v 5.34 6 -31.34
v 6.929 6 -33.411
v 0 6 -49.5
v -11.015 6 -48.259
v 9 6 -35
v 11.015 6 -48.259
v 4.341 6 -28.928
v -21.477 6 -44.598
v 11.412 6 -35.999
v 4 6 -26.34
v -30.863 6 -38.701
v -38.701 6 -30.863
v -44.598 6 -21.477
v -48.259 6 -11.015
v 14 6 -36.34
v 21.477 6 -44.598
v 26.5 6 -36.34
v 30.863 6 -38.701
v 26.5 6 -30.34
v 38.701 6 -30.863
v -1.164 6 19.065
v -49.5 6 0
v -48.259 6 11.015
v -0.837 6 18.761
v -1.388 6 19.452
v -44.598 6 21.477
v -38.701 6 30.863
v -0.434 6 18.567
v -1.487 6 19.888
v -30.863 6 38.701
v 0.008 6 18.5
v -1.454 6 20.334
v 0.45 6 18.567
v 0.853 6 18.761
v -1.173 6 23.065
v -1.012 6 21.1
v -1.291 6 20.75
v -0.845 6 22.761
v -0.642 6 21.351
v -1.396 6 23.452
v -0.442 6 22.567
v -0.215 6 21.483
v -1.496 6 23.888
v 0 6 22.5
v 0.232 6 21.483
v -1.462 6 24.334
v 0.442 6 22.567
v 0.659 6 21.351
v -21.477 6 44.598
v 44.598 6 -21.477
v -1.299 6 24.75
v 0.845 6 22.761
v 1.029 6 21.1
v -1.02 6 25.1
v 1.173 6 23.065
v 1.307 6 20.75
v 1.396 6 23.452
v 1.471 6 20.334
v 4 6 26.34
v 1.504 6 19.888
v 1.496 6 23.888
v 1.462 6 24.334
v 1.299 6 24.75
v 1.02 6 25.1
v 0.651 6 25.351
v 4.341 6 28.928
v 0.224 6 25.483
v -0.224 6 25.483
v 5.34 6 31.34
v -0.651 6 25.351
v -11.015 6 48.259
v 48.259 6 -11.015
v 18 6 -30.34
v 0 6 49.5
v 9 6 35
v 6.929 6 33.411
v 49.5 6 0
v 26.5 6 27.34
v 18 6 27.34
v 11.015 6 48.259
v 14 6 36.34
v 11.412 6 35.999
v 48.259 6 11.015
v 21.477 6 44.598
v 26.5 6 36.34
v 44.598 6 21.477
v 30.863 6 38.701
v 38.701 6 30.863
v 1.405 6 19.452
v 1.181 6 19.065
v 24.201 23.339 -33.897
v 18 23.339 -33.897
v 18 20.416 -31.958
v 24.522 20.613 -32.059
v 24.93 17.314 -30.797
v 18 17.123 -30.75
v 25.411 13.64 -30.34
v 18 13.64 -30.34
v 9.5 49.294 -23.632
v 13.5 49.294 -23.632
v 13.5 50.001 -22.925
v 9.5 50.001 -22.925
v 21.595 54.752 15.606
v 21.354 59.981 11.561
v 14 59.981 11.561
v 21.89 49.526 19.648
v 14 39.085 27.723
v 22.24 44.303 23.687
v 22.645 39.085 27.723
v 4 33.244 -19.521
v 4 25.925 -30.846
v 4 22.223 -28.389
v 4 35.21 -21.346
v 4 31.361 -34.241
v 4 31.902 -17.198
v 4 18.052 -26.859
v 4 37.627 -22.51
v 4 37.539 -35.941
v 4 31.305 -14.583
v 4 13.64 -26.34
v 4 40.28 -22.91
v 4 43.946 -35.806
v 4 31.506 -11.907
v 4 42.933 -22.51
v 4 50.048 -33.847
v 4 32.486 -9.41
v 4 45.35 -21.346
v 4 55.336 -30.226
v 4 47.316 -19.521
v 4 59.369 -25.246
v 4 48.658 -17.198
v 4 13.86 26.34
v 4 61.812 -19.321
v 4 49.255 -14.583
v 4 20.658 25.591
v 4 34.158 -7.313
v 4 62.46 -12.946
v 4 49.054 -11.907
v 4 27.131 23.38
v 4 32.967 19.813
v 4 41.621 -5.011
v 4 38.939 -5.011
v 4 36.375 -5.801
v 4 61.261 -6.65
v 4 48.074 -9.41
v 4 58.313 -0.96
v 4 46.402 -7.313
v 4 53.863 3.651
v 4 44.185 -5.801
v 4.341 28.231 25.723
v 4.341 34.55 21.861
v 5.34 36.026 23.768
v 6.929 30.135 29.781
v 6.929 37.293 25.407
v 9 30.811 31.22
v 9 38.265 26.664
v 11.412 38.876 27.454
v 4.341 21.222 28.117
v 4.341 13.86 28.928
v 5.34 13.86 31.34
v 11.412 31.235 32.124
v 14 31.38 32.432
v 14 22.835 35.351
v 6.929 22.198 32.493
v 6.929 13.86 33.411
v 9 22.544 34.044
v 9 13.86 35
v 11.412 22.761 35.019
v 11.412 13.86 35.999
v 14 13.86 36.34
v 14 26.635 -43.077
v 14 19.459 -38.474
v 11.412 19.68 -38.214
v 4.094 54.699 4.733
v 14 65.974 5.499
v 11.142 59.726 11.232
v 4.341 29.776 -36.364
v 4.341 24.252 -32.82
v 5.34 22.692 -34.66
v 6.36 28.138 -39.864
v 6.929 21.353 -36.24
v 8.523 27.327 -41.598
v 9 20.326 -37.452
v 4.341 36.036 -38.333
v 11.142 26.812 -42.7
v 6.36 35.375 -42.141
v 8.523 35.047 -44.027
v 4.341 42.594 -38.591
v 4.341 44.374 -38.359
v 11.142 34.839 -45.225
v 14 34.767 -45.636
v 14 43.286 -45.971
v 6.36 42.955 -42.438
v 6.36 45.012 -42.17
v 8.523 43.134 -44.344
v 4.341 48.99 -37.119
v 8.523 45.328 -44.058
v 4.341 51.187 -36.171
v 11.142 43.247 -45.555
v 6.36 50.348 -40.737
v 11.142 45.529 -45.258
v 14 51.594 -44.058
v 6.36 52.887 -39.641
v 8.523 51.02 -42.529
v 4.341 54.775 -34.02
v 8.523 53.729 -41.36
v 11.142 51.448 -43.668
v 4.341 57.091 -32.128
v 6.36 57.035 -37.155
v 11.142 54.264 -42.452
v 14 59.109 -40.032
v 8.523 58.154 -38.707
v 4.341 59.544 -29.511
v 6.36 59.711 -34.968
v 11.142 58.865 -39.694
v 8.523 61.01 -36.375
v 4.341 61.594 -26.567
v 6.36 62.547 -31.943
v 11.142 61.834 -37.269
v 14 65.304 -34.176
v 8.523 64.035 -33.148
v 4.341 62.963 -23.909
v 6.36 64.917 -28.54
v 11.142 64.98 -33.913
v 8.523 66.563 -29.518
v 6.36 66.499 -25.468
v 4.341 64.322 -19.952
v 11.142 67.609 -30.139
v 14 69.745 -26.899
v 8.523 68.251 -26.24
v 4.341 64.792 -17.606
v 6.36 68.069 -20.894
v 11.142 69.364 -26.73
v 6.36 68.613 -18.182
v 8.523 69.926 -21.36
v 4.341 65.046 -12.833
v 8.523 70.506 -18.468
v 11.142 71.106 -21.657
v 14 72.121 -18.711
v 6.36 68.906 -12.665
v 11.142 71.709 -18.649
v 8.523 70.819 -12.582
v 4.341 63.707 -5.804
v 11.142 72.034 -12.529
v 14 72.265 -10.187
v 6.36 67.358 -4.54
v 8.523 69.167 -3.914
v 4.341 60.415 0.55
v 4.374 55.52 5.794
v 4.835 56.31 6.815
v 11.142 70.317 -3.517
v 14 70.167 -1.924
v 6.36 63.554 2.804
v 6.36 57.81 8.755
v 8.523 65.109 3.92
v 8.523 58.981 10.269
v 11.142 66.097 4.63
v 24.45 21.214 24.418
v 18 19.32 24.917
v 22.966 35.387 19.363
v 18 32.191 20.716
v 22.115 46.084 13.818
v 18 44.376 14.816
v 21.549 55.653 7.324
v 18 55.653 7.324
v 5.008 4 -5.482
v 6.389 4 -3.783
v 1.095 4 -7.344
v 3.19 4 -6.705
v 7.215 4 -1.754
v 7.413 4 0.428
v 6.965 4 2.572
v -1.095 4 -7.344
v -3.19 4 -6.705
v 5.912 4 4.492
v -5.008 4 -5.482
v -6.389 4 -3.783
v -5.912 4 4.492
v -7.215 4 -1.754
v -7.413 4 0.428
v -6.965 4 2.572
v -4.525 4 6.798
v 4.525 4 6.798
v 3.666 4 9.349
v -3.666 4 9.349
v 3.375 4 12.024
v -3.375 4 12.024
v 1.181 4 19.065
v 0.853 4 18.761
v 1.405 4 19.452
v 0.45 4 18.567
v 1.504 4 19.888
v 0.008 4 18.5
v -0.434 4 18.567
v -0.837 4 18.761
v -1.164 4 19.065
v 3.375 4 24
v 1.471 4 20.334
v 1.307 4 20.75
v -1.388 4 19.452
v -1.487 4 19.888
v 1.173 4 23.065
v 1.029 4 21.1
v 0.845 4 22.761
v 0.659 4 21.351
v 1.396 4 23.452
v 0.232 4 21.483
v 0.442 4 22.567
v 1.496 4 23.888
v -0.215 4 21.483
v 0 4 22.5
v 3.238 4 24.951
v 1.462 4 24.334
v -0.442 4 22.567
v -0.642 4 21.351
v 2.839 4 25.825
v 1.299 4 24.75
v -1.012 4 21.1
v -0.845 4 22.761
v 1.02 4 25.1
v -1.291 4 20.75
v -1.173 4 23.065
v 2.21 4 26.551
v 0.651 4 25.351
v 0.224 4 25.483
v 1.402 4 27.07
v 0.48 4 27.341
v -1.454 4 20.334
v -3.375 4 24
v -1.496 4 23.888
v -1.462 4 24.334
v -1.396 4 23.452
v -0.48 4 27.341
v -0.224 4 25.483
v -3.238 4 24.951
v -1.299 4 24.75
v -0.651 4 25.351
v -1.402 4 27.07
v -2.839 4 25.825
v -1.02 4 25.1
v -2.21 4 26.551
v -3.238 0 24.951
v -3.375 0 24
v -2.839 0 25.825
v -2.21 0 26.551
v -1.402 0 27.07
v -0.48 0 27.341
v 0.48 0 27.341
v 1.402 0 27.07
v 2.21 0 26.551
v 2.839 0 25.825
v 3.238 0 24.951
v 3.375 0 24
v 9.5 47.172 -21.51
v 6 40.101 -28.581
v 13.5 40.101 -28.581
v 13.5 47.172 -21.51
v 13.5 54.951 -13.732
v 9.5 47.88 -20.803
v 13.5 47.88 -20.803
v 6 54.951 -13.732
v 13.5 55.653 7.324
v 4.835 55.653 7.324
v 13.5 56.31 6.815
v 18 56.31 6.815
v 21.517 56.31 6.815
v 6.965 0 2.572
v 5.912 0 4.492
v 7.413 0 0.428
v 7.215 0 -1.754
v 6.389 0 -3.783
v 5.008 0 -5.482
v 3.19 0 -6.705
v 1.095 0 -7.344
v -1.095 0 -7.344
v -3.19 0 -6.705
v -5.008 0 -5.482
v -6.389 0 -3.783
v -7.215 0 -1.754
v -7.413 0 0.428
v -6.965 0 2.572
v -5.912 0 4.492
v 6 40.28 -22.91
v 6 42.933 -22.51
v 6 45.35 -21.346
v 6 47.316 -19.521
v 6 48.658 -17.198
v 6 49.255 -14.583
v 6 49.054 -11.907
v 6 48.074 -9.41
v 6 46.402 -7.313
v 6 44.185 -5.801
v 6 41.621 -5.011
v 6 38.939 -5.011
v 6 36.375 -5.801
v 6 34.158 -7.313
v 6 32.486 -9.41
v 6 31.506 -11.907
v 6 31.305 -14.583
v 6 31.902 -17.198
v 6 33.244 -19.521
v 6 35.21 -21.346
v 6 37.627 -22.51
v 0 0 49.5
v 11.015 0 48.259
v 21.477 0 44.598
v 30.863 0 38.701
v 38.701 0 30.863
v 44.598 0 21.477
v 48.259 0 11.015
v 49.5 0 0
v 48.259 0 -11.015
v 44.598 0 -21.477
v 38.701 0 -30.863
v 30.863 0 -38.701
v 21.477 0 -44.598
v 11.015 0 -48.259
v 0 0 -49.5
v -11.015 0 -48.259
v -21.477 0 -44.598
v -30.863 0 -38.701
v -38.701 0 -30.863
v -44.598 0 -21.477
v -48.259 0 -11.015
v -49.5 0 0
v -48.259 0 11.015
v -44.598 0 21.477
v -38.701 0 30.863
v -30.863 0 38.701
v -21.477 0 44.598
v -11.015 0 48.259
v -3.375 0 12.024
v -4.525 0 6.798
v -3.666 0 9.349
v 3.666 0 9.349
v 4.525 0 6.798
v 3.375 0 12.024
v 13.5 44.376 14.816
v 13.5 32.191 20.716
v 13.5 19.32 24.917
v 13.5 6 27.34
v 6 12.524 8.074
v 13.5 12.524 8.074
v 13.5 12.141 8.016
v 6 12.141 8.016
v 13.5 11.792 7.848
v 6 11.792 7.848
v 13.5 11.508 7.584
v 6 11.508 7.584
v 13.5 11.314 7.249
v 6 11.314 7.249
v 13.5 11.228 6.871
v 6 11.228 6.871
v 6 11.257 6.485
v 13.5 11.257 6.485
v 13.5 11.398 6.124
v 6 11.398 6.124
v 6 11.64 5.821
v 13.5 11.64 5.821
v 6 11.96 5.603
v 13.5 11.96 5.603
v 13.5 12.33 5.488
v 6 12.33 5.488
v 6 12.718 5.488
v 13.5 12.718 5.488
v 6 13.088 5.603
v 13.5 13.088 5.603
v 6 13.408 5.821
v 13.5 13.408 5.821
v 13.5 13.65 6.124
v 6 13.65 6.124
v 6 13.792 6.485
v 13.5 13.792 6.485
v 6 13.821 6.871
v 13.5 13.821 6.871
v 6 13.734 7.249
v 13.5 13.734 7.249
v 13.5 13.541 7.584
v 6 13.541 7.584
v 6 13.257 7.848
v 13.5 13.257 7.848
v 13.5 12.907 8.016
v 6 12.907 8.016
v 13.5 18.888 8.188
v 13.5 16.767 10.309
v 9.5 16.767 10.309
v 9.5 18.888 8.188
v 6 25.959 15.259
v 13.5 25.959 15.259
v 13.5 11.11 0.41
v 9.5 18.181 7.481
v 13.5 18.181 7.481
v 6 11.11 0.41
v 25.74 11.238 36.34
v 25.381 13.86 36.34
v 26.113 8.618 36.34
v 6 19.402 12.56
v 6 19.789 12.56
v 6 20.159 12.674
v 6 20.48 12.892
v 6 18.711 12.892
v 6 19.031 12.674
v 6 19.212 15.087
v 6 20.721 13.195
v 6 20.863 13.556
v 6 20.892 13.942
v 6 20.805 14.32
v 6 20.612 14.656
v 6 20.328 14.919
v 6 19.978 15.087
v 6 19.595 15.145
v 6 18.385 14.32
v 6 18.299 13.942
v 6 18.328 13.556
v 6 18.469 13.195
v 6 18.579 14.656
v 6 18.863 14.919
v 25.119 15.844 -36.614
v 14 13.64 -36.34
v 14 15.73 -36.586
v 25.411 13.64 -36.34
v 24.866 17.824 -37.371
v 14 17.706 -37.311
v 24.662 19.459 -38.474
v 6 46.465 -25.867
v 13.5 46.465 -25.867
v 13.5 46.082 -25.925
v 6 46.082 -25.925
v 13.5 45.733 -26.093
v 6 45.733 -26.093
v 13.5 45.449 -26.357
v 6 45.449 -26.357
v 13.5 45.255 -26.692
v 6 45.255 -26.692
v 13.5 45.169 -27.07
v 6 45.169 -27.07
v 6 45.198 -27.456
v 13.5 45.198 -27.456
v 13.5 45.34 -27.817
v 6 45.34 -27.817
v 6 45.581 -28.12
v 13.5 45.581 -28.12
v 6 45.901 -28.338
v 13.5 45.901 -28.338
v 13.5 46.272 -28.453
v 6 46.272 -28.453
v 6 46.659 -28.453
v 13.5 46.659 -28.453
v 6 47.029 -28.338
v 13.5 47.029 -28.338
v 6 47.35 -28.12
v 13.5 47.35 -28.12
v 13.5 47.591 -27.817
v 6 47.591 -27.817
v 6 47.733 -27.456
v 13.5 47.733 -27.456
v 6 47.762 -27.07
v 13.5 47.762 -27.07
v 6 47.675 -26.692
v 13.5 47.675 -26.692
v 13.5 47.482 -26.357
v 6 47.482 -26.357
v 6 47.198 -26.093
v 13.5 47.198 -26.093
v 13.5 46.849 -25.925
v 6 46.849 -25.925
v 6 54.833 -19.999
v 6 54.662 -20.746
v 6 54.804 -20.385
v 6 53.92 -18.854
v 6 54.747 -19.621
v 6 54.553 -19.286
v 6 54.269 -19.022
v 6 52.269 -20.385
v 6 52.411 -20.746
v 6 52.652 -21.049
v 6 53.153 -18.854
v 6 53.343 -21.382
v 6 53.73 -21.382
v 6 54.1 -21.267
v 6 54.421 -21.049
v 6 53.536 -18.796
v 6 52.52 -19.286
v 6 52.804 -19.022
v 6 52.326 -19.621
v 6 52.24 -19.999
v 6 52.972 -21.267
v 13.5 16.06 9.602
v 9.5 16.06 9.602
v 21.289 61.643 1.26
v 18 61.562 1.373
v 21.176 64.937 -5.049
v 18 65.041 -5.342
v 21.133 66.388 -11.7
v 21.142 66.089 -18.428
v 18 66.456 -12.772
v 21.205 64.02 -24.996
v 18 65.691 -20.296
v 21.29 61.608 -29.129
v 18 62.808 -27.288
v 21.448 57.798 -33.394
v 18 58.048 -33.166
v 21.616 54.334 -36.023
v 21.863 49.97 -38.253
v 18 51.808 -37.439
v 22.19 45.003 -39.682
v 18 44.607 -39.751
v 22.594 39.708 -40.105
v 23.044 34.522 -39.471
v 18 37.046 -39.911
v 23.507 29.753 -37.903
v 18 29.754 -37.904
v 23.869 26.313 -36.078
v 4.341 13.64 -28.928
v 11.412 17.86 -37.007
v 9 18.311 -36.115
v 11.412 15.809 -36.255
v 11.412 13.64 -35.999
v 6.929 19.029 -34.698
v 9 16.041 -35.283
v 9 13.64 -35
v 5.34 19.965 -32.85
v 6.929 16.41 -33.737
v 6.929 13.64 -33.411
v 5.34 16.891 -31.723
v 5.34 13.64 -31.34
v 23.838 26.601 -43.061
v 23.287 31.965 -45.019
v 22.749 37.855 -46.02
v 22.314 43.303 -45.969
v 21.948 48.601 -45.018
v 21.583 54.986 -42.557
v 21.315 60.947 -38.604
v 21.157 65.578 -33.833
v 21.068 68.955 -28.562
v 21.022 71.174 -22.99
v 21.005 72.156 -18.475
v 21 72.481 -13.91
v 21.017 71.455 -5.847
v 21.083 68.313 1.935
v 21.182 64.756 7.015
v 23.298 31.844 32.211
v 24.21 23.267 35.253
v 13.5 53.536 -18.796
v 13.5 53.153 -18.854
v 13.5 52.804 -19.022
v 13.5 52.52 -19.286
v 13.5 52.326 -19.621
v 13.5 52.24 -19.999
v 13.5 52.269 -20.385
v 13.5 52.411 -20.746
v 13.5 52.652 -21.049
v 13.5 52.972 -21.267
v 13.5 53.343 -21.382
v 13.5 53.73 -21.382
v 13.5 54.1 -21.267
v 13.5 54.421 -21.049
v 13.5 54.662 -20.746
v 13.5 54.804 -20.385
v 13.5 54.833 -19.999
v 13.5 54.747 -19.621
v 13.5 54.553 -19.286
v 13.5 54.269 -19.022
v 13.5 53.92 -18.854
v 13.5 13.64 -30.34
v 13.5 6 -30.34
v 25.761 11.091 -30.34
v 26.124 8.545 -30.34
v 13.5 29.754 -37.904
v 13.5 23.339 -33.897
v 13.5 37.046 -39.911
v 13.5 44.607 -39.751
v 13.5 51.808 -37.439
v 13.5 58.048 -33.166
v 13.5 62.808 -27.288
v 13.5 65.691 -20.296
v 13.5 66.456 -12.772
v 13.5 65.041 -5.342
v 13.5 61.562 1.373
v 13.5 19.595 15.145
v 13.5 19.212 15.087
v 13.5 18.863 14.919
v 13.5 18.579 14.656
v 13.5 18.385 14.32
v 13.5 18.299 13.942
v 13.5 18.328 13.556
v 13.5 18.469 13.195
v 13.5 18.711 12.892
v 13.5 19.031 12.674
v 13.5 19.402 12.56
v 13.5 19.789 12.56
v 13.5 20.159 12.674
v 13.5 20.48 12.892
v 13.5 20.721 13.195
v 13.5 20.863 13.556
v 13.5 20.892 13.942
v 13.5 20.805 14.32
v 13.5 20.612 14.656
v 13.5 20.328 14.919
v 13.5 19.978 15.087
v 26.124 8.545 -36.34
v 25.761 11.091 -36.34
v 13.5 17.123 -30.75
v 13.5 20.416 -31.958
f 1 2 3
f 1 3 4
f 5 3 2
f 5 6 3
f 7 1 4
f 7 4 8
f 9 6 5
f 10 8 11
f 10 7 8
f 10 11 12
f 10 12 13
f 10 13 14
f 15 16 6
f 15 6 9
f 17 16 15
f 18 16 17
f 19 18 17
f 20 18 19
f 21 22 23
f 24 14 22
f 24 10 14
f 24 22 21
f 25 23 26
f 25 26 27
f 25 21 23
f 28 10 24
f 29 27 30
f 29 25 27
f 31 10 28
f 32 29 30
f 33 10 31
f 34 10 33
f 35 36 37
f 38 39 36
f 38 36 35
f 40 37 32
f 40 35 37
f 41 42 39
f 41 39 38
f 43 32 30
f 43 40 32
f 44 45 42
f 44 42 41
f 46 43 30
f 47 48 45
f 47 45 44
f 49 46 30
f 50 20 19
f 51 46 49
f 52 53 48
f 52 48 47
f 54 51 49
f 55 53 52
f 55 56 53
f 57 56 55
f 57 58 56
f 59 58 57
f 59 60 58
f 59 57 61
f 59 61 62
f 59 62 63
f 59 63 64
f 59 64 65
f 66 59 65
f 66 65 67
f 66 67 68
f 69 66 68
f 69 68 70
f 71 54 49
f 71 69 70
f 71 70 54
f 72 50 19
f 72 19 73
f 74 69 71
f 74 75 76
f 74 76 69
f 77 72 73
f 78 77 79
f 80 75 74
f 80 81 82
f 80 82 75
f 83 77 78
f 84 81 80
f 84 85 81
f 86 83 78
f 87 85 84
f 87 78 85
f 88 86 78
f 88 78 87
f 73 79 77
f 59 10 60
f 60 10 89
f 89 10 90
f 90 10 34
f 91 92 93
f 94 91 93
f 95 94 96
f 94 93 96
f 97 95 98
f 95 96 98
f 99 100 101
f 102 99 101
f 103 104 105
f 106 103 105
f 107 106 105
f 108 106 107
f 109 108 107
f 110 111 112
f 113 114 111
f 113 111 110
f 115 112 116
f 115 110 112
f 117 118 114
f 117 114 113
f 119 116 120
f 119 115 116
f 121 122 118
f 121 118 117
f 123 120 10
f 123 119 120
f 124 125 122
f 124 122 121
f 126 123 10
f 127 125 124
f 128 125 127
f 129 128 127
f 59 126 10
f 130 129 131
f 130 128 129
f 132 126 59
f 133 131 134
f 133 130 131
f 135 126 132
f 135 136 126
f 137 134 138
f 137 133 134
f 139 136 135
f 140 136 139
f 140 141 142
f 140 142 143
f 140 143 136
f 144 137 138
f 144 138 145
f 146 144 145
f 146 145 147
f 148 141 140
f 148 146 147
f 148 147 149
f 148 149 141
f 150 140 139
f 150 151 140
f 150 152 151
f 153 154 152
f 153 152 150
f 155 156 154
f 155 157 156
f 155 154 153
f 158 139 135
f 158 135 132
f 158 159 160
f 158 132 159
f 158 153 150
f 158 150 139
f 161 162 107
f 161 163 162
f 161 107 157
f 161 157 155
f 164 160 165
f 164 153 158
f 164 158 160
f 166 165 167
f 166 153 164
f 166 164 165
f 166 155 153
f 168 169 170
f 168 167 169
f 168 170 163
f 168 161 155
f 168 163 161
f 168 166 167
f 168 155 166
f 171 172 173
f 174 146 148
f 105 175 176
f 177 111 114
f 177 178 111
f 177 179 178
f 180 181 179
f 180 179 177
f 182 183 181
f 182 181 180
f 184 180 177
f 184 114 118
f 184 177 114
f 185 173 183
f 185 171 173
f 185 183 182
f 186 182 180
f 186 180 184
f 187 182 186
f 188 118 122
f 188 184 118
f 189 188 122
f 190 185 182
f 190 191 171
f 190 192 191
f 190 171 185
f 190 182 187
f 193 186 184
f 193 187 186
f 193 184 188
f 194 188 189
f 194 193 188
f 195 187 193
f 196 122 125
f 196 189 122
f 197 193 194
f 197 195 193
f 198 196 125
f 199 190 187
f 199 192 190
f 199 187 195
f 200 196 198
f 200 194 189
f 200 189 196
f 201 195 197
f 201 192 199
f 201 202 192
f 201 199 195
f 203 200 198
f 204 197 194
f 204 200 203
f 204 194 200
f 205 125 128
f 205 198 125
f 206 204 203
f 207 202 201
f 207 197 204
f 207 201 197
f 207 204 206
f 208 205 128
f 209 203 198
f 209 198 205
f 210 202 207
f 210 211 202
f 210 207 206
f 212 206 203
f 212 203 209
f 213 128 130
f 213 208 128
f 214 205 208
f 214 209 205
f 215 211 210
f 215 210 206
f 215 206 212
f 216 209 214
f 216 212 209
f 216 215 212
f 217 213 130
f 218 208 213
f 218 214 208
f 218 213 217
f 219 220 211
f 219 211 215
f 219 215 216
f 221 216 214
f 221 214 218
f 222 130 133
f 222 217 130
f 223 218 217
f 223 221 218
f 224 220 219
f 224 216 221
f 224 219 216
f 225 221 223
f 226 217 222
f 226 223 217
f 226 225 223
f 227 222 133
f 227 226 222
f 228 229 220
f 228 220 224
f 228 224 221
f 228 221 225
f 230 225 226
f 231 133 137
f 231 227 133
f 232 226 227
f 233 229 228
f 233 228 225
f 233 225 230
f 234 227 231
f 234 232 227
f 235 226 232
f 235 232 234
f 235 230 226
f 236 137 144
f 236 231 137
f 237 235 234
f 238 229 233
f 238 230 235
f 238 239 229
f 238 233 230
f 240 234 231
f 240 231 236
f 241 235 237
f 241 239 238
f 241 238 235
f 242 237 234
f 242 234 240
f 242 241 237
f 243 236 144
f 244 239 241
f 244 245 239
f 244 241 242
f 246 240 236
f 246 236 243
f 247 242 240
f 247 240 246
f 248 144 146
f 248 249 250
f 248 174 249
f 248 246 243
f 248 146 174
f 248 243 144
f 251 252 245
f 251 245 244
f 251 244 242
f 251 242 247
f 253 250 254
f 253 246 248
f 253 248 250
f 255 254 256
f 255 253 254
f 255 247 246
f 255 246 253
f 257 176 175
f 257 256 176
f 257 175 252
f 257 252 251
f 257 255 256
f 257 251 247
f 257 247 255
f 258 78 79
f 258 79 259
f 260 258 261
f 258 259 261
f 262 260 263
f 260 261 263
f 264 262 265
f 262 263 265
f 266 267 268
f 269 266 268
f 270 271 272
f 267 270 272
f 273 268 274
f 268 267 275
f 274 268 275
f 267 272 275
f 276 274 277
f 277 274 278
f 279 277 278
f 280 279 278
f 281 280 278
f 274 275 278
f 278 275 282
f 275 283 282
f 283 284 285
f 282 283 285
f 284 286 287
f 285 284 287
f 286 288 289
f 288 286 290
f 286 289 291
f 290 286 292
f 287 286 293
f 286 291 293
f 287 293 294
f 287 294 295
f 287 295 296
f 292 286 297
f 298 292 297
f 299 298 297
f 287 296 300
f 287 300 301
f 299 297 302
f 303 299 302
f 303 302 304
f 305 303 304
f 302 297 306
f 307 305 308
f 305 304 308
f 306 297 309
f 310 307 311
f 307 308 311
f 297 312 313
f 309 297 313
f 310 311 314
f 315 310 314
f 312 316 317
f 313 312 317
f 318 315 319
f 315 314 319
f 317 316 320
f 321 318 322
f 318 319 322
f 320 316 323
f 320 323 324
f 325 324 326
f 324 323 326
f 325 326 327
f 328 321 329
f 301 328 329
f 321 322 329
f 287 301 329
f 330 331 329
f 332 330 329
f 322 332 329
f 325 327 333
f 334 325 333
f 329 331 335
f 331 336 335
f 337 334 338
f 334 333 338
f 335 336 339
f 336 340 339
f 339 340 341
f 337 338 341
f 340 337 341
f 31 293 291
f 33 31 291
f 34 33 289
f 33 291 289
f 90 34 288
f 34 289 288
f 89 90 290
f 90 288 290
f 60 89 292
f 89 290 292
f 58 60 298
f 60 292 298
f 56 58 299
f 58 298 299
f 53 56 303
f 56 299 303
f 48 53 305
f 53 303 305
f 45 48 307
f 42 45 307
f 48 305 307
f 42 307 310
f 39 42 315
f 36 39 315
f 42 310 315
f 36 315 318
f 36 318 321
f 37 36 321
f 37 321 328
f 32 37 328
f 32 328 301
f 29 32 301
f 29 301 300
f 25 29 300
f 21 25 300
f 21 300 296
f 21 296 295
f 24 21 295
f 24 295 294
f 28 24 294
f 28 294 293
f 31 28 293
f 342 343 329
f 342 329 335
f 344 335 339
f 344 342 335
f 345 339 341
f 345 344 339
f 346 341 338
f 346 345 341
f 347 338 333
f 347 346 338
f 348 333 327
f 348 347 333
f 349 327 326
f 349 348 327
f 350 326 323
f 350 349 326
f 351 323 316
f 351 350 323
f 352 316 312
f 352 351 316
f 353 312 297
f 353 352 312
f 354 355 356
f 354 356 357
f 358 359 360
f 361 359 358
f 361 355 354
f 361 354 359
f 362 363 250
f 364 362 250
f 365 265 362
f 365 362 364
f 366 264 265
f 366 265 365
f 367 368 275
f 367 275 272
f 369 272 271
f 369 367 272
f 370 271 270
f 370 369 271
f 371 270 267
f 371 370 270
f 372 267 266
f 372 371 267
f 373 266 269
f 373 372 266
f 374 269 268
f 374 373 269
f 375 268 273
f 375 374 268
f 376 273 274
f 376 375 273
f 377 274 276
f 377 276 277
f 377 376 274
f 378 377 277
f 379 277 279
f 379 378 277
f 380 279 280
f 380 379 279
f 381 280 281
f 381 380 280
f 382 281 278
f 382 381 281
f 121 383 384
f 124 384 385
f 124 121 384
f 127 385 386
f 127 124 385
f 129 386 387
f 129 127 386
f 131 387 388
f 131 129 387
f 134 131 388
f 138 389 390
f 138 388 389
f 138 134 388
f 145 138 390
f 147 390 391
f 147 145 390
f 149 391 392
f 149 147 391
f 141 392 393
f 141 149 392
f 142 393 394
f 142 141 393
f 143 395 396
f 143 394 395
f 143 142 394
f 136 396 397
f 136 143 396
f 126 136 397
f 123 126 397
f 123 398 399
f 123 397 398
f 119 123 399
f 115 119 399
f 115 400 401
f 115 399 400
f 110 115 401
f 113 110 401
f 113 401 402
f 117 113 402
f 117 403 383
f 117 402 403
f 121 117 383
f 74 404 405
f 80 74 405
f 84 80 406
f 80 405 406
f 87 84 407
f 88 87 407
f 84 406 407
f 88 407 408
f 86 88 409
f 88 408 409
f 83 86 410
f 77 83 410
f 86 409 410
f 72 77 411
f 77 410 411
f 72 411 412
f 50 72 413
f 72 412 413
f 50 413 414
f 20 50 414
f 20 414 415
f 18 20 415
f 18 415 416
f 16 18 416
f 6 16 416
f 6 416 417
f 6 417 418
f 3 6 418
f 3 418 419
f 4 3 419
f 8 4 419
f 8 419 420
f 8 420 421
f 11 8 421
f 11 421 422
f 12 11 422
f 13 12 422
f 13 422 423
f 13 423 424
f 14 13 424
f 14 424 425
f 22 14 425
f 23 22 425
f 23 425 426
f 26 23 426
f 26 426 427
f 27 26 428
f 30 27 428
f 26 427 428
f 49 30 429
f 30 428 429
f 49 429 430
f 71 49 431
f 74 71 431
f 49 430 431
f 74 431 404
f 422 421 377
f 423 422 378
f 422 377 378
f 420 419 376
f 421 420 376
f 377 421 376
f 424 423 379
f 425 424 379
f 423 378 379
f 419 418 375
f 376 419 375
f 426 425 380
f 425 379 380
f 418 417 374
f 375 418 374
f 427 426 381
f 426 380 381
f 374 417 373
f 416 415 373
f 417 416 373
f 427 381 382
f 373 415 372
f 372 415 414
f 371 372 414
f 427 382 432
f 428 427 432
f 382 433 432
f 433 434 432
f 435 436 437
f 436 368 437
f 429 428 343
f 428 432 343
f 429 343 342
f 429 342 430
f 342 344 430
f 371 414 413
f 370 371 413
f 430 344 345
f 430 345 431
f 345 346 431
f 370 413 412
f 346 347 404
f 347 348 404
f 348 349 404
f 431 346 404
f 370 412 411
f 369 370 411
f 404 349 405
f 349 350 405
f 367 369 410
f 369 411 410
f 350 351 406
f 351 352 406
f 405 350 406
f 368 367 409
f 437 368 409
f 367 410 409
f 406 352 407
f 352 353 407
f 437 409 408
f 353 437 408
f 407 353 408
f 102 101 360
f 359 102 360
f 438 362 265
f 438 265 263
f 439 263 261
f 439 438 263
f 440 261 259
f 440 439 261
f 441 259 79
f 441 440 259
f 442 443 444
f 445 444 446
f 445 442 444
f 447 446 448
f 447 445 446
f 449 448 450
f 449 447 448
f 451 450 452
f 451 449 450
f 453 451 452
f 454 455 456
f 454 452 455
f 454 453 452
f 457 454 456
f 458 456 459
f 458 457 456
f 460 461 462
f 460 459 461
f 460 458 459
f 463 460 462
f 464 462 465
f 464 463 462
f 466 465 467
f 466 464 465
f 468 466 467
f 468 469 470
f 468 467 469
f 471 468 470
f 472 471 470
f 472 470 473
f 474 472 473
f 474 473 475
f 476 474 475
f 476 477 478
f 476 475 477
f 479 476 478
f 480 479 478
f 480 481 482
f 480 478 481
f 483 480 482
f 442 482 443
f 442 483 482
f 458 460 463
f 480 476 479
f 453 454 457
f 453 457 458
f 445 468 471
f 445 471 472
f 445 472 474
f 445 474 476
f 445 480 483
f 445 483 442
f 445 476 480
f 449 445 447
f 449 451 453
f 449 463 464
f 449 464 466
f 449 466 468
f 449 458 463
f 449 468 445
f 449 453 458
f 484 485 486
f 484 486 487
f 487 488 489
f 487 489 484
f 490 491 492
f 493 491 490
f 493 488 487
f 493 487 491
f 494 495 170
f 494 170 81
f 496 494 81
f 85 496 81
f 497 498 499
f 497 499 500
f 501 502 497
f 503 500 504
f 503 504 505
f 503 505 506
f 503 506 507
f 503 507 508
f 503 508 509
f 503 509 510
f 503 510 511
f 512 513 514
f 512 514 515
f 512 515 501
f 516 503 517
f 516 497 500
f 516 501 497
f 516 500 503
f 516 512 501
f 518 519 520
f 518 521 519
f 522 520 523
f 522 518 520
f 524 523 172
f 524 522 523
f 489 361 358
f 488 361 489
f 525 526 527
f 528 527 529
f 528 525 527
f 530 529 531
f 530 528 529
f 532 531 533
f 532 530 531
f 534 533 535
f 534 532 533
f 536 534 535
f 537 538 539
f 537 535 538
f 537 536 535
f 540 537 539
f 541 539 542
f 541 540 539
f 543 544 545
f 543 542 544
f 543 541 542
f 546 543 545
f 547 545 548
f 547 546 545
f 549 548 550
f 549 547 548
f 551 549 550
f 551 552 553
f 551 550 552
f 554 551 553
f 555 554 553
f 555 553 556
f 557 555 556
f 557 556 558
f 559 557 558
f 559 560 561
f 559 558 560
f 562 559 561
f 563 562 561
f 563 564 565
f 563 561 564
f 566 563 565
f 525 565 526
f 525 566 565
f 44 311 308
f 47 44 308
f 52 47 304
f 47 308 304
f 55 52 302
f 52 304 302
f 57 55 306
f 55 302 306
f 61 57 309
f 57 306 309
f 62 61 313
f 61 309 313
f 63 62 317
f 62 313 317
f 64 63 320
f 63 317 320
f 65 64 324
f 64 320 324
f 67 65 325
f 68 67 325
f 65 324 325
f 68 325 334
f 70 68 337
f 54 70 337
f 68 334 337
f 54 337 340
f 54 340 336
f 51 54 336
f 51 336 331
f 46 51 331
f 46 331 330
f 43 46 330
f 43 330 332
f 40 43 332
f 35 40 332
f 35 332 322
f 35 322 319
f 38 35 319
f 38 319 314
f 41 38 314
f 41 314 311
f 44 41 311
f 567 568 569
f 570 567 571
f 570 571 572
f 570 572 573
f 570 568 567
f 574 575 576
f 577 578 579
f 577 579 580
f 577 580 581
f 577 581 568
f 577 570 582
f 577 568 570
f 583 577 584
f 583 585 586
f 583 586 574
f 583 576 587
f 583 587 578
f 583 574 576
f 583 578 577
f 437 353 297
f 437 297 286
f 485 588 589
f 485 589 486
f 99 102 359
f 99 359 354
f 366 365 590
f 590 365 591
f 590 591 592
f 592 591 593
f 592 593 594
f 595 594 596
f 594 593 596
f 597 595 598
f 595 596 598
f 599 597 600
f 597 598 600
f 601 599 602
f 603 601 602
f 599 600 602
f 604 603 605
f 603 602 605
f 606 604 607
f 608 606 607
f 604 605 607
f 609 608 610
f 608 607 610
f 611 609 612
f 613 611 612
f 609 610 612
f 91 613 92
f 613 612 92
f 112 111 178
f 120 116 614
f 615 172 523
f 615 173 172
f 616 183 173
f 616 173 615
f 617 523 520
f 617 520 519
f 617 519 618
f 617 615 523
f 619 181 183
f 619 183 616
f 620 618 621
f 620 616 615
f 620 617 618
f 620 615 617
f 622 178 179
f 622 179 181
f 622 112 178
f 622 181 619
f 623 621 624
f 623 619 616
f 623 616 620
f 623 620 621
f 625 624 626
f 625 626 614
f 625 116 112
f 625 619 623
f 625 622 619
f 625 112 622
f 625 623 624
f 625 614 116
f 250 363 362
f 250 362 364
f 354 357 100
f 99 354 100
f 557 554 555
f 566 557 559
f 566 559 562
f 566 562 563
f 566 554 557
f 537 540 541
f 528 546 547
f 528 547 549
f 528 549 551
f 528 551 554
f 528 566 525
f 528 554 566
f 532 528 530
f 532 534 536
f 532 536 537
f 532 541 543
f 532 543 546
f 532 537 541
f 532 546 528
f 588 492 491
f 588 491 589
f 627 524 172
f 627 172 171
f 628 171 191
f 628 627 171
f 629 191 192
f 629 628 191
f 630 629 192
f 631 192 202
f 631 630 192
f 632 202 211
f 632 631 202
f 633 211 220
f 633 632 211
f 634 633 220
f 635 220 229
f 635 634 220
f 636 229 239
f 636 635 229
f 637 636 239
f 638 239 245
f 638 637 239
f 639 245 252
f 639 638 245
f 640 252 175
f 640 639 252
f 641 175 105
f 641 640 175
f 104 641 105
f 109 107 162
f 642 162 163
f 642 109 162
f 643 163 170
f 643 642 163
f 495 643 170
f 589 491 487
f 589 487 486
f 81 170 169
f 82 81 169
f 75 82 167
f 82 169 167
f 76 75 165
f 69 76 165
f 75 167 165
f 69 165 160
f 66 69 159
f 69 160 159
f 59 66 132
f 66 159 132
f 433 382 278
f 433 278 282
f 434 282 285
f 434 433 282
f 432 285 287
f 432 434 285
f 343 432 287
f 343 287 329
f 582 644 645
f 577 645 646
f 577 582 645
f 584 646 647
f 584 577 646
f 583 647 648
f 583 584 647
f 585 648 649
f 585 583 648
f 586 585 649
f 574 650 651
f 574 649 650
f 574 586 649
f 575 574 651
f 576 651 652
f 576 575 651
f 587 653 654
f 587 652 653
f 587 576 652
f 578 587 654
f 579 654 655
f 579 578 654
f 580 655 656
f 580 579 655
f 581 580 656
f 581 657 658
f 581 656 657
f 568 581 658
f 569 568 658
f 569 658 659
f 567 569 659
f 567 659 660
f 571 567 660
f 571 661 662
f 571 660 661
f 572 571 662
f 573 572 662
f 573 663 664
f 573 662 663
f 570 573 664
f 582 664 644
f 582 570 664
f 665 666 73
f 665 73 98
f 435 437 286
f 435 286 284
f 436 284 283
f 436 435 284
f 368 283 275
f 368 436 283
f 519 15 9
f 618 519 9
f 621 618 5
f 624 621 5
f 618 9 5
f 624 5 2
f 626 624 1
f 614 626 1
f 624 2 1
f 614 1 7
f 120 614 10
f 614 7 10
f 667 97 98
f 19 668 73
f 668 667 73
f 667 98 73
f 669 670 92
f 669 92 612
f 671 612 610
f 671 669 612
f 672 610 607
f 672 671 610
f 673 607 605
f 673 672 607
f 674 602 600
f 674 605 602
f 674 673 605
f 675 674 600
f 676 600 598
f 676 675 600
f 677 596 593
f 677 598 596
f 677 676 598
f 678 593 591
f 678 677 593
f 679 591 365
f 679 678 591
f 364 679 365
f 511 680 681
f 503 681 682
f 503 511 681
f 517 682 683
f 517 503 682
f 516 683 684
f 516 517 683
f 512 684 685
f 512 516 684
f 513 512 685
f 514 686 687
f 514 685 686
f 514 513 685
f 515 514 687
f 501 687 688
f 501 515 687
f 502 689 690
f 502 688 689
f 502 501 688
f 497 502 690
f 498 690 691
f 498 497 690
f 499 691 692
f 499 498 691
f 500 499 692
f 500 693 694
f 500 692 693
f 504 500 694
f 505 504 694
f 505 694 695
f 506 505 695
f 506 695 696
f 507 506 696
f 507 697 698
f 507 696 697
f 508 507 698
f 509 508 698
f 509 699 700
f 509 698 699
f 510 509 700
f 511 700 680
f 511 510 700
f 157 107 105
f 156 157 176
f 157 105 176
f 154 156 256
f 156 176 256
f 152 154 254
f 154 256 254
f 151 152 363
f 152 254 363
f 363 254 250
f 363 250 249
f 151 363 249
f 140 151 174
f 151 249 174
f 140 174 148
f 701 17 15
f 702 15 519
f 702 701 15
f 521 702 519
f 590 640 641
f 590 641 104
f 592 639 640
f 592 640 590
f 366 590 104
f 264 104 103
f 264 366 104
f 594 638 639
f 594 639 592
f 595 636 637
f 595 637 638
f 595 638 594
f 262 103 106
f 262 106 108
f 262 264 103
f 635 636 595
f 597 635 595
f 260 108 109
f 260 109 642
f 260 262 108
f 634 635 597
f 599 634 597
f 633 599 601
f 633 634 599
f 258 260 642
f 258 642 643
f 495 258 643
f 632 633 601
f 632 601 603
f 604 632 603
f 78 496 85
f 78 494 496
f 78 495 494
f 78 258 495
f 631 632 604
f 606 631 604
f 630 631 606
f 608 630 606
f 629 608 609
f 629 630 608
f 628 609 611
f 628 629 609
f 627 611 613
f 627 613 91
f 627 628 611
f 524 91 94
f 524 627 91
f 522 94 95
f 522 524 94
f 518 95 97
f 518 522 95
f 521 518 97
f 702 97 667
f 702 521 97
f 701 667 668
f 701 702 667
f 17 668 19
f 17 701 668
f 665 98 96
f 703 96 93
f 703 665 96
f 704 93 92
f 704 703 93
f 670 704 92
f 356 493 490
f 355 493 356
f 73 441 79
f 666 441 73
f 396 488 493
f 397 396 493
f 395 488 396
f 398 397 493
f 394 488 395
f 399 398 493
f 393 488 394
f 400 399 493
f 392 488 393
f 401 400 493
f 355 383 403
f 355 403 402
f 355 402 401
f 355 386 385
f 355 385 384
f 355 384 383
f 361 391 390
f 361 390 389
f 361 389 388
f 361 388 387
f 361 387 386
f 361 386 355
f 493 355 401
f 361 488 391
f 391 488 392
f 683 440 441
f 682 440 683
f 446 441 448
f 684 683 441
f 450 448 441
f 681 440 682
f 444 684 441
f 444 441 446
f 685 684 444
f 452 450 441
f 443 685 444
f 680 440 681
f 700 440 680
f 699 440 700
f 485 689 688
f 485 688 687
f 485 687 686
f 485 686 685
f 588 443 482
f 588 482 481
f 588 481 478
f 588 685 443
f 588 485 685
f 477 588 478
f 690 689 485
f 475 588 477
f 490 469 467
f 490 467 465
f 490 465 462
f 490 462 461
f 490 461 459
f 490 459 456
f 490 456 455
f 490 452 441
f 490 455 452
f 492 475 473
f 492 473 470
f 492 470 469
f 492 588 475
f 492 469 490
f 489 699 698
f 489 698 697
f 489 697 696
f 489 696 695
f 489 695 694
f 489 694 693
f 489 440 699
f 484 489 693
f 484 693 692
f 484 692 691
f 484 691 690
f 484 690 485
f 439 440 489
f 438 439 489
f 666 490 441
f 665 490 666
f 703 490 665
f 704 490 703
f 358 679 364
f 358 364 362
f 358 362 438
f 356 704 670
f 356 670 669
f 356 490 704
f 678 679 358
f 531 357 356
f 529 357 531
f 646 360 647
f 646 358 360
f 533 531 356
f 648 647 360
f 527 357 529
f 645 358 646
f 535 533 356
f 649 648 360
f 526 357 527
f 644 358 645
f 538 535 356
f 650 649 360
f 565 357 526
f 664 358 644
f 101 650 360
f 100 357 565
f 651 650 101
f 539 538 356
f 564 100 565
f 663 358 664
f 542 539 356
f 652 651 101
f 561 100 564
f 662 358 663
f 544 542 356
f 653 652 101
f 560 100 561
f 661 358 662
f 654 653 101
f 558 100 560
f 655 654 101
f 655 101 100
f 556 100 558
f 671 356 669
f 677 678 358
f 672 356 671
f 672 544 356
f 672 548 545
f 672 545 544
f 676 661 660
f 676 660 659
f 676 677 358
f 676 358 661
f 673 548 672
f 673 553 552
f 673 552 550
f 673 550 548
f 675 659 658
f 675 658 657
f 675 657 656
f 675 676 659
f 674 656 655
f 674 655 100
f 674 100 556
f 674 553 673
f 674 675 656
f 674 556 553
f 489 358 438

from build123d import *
from build123d.topology import SkipClean

# Parameters (mm, degrees)
SKETCH1_R                       = 49.5
BOSS_EXTRUDE1_DEPTH             = 6
BOSS_EXTRUDE2_START             = 4
SKETCH3_R                       = 9
BOSS_EXTRUDE2_DEPTH             = 14
SKETCH4_R                       = 1.5
CUT_EXTRUDE2_DEPTH              = 4
CUT_EXTRUDE3_START              = 6
SKETCH5_R                       = 1.3
CUT_EXTRUDE3_DEPTH              = 91.541405022
BOSS_EXTRUDE3_DEPTH             = 9
BOSS_EXTRUDE3_DIRECTION_2_REACH = 108.894
CUT_EXTRUDE4_DEPTH              = 101.767140704
CUT_EXTRUDE4_DEPTH_BACK         = 101.767140704
FILLET1_R                       = 10
SKETCH4_3_R                     = 1.5
CUT_EXTRUDE5_DEPTH              = 10
CUT_EXTRUDE6_DEPTH              = 8.5
CUT_EXTRUDE8_START              = -4.5
CUT_EXTRUDE8_DEPTH              = 4.5


with BuildPart() as part:
    # Sketch1 → Boss-Extrude1 (new body)
    with BuildSketch(Plane(origin=(0, 0, 0), x_dir=(1, 0, 0), z_dir=(0, 1, 0))):
        with Locations(Location((0, 0, 0), (0, 0, 270))):
            Circle(SKETCH1_R)
    extrude(amount=BOSS_EXTRUDE1_DEPTH)

    # Sketch3 → Boss-Extrude2 (add)
    with BuildSketch(Plane(origin=(0, 0, 0), x_dir=(0, 0, -1), z_dir=(1, 0, 0)).offset(BOSS_EXTRUDE2_START)):
        with BuildLine():
            Line((30.34, 6), (-30.34, 6))
            Line((-30.34, 6), (-30.34, 13.86))
            ThreePointArc((-30.34, 13.86), (-28.448562423, 25.248290284), (-22.977345695, 35.413745473))
            Line((-22.977345695, 35.413745473), (-6.815416301, 56.309885037))
            ThreePointArc((-6.815416301, 56.309885037), (30.399692788, 60.641486363), (33.897357348, 23.338759155))
            ThreePointArc((33.897357348, 23.338759155), (31.257393001, 18.805286063), (30.34, 13.64))
            Line((30.34, 13.64), (30.34, 6))
        make_face()
        with Locations((13.91, 40.28)):
            Circle(SKETCH3_R, mode=Mode.SUBTRACT)
    extrude(amount=BOSS_EXTRUDE2_DEPTH)

    # Sketch4 → Cut-Extrude2 (cut)
    with BuildSketch(Plane.XZ):
        with BuildLine():
            ThreePointArc((-5.911981132, 4.49211577), (-4.02628005, 8.050346325), (-3.375, 12.024350294))
            Line((-3.375, 12.024350294), (-3.375, 24))
            ThreePointArc((-3.375, 24), (0, 27.375), (3.375, 24))
            Line((3.375, 24), (3.375, 12.024350294))
            ThreePointArc((3.375, 12.024350294), (4.02628005, 8.050346325), (5.911981132, 4.49211577))
            ThreePointArc((5.911981132, 4.49211577), (0, -7.425), (-5.911981132, 4.49211577))
        make_face()
        with Locations(Location((0.008355438, 20, 0), (0, 0, 270))):
            Circle(SKETCH4_R, mode=Mode.SUBTRACT)
        with Locations(Location((0, 24, 0), (0, 0, 270))):
            Circle(SKETCH4_R, mode=Mode.SUBTRACT)
    extrude(amount=-CUT_EXTRUDE2_DEPTH, mode=Mode.SUBTRACT)

    # Sketch5 → Cut-Extrude3 (cut, through all)
    with BuildSketch(Plane(origin=(0, 0, 0), x_dir=(0, 0, -1), z_dir=(1, 0, 0)).offset(CUT_EXTRUDE3_START)):
        with Locations(Location((27.167164466, 46.465339059, 0), (0, 0, 180))):
            Circle(SKETCH5_R)
        with Locations(Location((20.096096654, 53.536406871, 0), (0, 0, 180))):
            Circle(SKETCH5_R)
        with Locations(Location((-13.845028843, 19.595281374, 0), (0, 0, 180))):
            Circle(SKETCH5_R)
        with Locations(Location((-6.773961031, 12.524213562, 0), (0, 0, 180))):
            Circle(SKETCH5_R)
        Polygon((-0.41, 11.11), (28.581378029, 40.101378029), (13.732135624, 54.950620434), (-15.259242405, 25.959242405), align=None)
    extrude(amount=CUT_EXTRUDE3_DEPTH, mode=Mode.SUBTRACT)

    # Sketch6 → Boss-Extrude3 (add)
    with BuildSketch(Plane(origin=(18, 0, 0), x_dir=(0, 0, -1), z_dir=(1, 0, 0))):
        with BuildLine():
            ThreePointArc((-7.323520562, 55.652945058), (-7.070150425, 55.981942529), (-6.815416301, 56.309885037))
            ThreePointArc((-6.815416301, 56.309885037), (30.399692788, 60.641486363), (33.897357348, 23.338759155))
            ThreePointArc((33.897357348, 23.338759155), (31.257393001, 18.805286063), (30.34, 13.64))
            Line((30.34, 13.64), (30.34, 6))
            Line((30.34, 6), (36.34, 6))
            Line((36.34, 6), (36.34, 13.64))
            ThreePointArc((36.34, 13.64), (36.890435801, 16.739171638), (38.474414409, 19.459255493))
            ThreePointArc((38.474414409, 19.459255493), (34.175793024, 65.304218074), (-11.561487098, 59.980690397))
            Line((-11.561487098, 59.980690397), (-27.723416492, 39.084550833))
            ThreePointArc((-27.723416492, 39.084550833), (-34.126432833, 27.187823116), (-36.34, 13.86))
            Line((-36.34, 13.86), (-36.34, 6))
            Line((-36.34, 6), (-30.34, 6))
            Line((-30.34, 6), (-30.34, 13.86))
            ThreePointArc((-30.34, 13.86), (-28.448562423, 25.248290284), (-22.977345695, 35.413745473))
            Line((-22.977345695, 35.413745473), (-7.323520562, 55.652945058))
        make_face()
        with BuildLine():
            ThreePointArc((-27.34, 6), (-20.716272, 32.190863083), (-7.323520562, 55.652945058))
            Line((-7.323520562, 55.652945058), (-22.977345695, 35.413745473))
            ThreePointArc((-22.977345695, 35.413745473), (-28.448562423, 25.248290284), (-30.34, 13.86))
            Line((-30.34, 13.86), (-30.34, 6))
            Line((-30.34, 6), (-27.34, 6))
        make_face()
    extrude(amount=BOSS_EXTRUDE3_DEPTH)

    # Boss-Extrude3 direction 2: up to this face of the body (flat: up to its plane)
    boss_extrude3_direction_2_end = Plane(part.part.faces().sort_by_distance((4, 32.233427389, -6.147611346))[0])
    # Sketch6 → Boss-Extrude3 direction 2 (add, up to the picked face)
    with BuildSketch(Plane(origin=(18, 0, 0), x_dir=(0, 0, -1), z_dir=(1, 0, 0)), mode=Mode.PRIVATE) as boss_extrude3_direction_2_sk1:
        with BuildLine():
            ThreePointArc((-7.323520562, 55.652945058), (-7.070150425, 55.981942529), (-6.815416301, 56.309885037))
            ThreePointArc((-6.815416301, 56.309885037), (30.399692788, 60.641486363), (33.897357348, 23.338759155))
            ThreePointArc((33.897357348, 23.338759155), (31.257393001, 18.805286063), (30.34, 13.64))
            Line((30.34, 13.64), (30.34, 6))
            Line((30.34, 6), (36.34, 6))
            Line((36.34, 6), (36.34, 13.64))
            ThreePointArc((36.34, 13.64), (36.890435801, 16.739171638), (38.474414409, 19.459255493))
            ThreePointArc((38.474414409, 19.459255493), (34.175793024, 65.304218074), (-11.561487098, 59.980690397))
            Line((-11.561487098, 59.980690397), (-27.723416492, 39.084550833))
            ThreePointArc((-27.723416492, 39.084550833), (-34.126432833, 27.187823116), (-36.34, 13.86))
            Line((-36.34, 13.86), (-36.34, 6))
            Line((-36.34, 6), (-30.34, 6))
            Line((-30.34, 6), (-30.34, 13.86))
            ThreePointArc((-30.34, 13.86), (-28.448562423, 25.248290284), (-22.977345695, 35.413745473))
            Line((-22.977345695, 35.413745473), (-7.323520562, 55.652945058))
        make_face()
    boss_extrude3_direction_2_tool1 = split(extrude(boss_extrude3_direction_2_sk1.sketch, amount=-BOSS_EXTRUDE3_DIRECTION_2_REACH, mode=Mode.PRIVATE), bisect_by=boss_extrude3_direction_2_end, keep=Keep.BOTH, mode=Mode.PRIVATE)
    # Sketch6 → Boss-Extrude3 direction 2 (add, up to the picked face)
    with BuildSketch(Plane(origin=(18, 0, 0), x_dir=(0, 0, -1), z_dir=(1, 0, 0)), mode=Mode.PRIVATE) as boss_extrude3_direction_2_sk2:
        with BuildLine():
            ThreePointArc((-27.34, 6), (-20.716272, 32.190863083), (-7.323520562, 55.652945058))
            Line((-7.323520562, 55.652945058), (-22.977345695, 35.413745473))
            ThreePointArc((-22.977345695, 35.413745473), (-28.448562423, 25.248290284), (-30.34, 13.86))
            Line((-30.34, 13.86), (-30.34, 6))
            Line((-30.34, 6), (-27.34, 6))
        make_face()
    boss_extrude3_direction_2_tool2 = split(extrude(boss_extrude3_direction_2_sk2.sketch, amount=-BOSS_EXTRUDE3_DIRECTION_2_REACH, mode=Mode.PRIVATE), bisect_by=boss_extrude3_direction_2_end, keep=Keep.BOTH, mode=Mode.PRIVATE)
    add(boss_extrude3_direction_2_tool1.solids().sort_by(Axis((18, 56.62993, 7.907949), (-1, 0, 0)))[0])
    add(boss_extrude3_direction_2_tool2.solids().sort_by(Axis((18, 24.594123, 24.897114), (-1, 0, 0)))[0])

    # Sketch7 → Cut-Extrude4 (cut, two sides: drawn at the far end of the back side and taken through both)
    with BuildSketch(Plane.XY.offset(-CUT_EXTRUDE4_DEPTH_BACK)):
        with BuildLine():
            Line((247.767802528, 72.481146829), (27, 72.481146829))
            Line((27, 72.481146829), (21, 72.481146829))
            ThreePointArc((21, 72.481146829), (22.640053286, 39.148747277), (26.5, 6))
            Line((26.5, 6), (27, 6))
            Line((27, 6), (247.767802528, 6))
            Line((247.767802528, 6), (689.303407584, 6))
            Line((689.303407584, 6), (689.303407584, 72.481146829))
            Line((689.303407584, 72.481146829), (247.767802528, 72.481146829))
        make_face()
    extrude(amount=CUT_EXTRUDE4_DEPTH + CUT_EXTRUDE4_DEPTH_BACK, mode=Mode.SUBTRACT)

    # Fillet1
    # the kernel refuses this fillet: 10 mm, written as the material it takes off along each edge
    with BuildSketch(Plane(origin=(4, 13.86, 36.34), x_dir=(0, 0, -1), z_dir=(0, -1, 0))) as fillet1_piece_1:
        with BuildLine():
            CenterArc((FILLET1_R, FILLET1_R), FILLET1_R, 180, 90)
            Line((0, FILLET1_R), (0, 0))
            Line((0, 0), (FILLET1_R, 0))
        make_face()
    extrude(amount=7.86, mode=Mode.SUBTRACT)
    with BuildSketch(Plane(origin=(4, 13.86, -4.89), x_dir=(0, 0.6118008933556042, 0.7910117994627416), z_dir=(0, 0.7910117994627416, -0.6118008933556042))) as fillet1_piece_2:
        with BuildLine():
            CenterArc((41.23 - FILLET1_R, FILLET1_R), FILLET1_R, 270, 90)
            Line((41.23, FILLET1_R), (41.23, 0))
            Line((41.23, 0), (41.23 - FILLET1_R, 0))
        make_face()
    revolve(axis=Axis((4, 13.86, -4.89), (1, 0, 0)), revolution_arc=37.719833498, mode=Mode.SUBTRACT)
    with BuildSketch(Plane(origin=(4, 59.980690397, 11.561487098), x_dir=(0, -0.6118008933556051, -0.791011799462741), z_dir=(0, -0.791011799462741, 0.6118008933556051))) as fillet1_piece_3:
        with BuildLine():
            CenterArc((FILLET1_R, FILLET1_R), FILLET1_R, 180, 90)
            Line((0, FILLET1_R), (0, 0))
            Line((0, 0), (FILLET1_R, 0))
        make_face()
    extrude(amount=26.4169758, mode=Mode.SUBTRACT)
    with BuildSketch(Plane(origin=(4, 40.28, -13.91), x_dir=(0, -0.646583943664495, -0.7628428434450107), z_dir=(0, -0.7628428434450107, 0.646583943664495))) as fillet1_piece_4:
        with BuildLine():
            CenterArc((32.201146829 - FILLET1_R, FILLET1_R), FILLET1_R, 270, 90)
            Line((32.201146829, FILLET1_R), (32.201146829, 0))
            Line((32.201146829, 0), (32.201146829 - FILLET1_R, 0))
        make_face()
    revolve(axis=Axis((4, 40.28, -13.91), (1, 0, 0)), revolution_arc=182.564704766, mode=Mode.SUBTRACT)
    with BuildSketch(Plane(origin=(4, 6, -36.34), x_dir=(0, 0, 1), z_dir=(0, 1, 0))) as fillet1_piece_5:
        with BuildLine():
            CenterArc((FILLET1_R, FILLET1_R), FILLET1_R, 180, 90)
            Line((0, FILLET1_R), (0, 0))
            Line((0, 0), (FILLET1_R, 0))
        make_face()
    extrude(amount=7.64, mode=Mode.SUBTRACT)
    with BuildSketch(Plane(origin=(4, 13.64, -45.34), x_dir=(0, 0.646583943664497, 0.7628428434450091), z_dir=(0, 0.7628428434450091, -0.646583943664497))) as fillet1_piece_6:
        with BuildLine():
            CenterArc((9 + FILLET1_R, FILLET1_R), FILLET1_R, 180, 90)
            Line((9, FILLET1_R), (9, 0))
            Line((9, 0), (9 + FILLET1_R, 0))
        make_face()
    revolve(axis=Axis((4, 13.64, -45.34), (1, 0, 0)), revolution_arc=40.284538264, mode=Mode.SUBTRACT)

    # Sketch4<3> → Cut-Extrude5 (cut)
    with BuildSketch(Plane.XZ):
        with Locations(Location((0, 24, 0), (0, 0, 270))):
            Circle(SKETCH4_3_R)
        with Locations(Location((0.008355438, 20, 0), (0, 0, 270))):
            Circle(SKETCH4_3_R)
    extrude(amount=-CUT_EXTRUDE5_DEPTH, mode=Mode.SUBTRACT)

    # Sketch8 → Cut-Extrude6 (cut)
    with BuildSketch(Plane(origin=(18, 0, 0), x_dir=(0, 0, -1), z_dir=(1, 0, 0))):
        Polygon((-8.188174593, 18.888174593), (-7.481067812, 18.181067812), (-9.602388155, 16.059747468), (-10.309494937, 16.766854249), align=None)
        Polygon((22.924523779, 50.000872965), (20.803203436, 47.879552622), (21.510310217, 47.172445841), (23.63163056, 49.293766184), align=None)
    extrude(amount=-CUT_EXTRUDE6_DEPTH, mode=Mode.SUBTRACT)

    # Sketch9 → Cut-Extrude8 (cut)
    with SkipClean():  # the faces are left unmerged after this step: merging them gives an invalid solid
        with BuildSketch(Plane(origin=(18, 0, 0), x_dir=(0, 0, -1), z_dir=(1, 0, 0)).offset(CUT_EXTRUDE8_START)):
            with BuildLine():
                Line((-27.34, 6), (30.34, 6))
                Line((30.34, 6), (30.34, 13.64))
                ThreePointArc((30.34, 13.64), (31.257393001, 18.805286063), (33.897357348, 23.338759155))
                ThreePointArc((33.897357348, 23.338759155), (30.399692788, 60.641486363), (-6.815416301, 56.309885037))
                Line((-6.815416301, 56.309885037), (-7.323520562, 55.652945058))
                ThreePointArc((-7.323520562, 55.652945058), (-20.716272, 32.190863083), (-27.34, 6))
            make_face()
        extrude(amount=CUT_EXTRUDE8_DEPTH, mode=Mode.SUBTRACT)
    add(part.part.scale(1), mode=Mode.REPLACE)  # the faces are merged on a copy


solid = part.part
